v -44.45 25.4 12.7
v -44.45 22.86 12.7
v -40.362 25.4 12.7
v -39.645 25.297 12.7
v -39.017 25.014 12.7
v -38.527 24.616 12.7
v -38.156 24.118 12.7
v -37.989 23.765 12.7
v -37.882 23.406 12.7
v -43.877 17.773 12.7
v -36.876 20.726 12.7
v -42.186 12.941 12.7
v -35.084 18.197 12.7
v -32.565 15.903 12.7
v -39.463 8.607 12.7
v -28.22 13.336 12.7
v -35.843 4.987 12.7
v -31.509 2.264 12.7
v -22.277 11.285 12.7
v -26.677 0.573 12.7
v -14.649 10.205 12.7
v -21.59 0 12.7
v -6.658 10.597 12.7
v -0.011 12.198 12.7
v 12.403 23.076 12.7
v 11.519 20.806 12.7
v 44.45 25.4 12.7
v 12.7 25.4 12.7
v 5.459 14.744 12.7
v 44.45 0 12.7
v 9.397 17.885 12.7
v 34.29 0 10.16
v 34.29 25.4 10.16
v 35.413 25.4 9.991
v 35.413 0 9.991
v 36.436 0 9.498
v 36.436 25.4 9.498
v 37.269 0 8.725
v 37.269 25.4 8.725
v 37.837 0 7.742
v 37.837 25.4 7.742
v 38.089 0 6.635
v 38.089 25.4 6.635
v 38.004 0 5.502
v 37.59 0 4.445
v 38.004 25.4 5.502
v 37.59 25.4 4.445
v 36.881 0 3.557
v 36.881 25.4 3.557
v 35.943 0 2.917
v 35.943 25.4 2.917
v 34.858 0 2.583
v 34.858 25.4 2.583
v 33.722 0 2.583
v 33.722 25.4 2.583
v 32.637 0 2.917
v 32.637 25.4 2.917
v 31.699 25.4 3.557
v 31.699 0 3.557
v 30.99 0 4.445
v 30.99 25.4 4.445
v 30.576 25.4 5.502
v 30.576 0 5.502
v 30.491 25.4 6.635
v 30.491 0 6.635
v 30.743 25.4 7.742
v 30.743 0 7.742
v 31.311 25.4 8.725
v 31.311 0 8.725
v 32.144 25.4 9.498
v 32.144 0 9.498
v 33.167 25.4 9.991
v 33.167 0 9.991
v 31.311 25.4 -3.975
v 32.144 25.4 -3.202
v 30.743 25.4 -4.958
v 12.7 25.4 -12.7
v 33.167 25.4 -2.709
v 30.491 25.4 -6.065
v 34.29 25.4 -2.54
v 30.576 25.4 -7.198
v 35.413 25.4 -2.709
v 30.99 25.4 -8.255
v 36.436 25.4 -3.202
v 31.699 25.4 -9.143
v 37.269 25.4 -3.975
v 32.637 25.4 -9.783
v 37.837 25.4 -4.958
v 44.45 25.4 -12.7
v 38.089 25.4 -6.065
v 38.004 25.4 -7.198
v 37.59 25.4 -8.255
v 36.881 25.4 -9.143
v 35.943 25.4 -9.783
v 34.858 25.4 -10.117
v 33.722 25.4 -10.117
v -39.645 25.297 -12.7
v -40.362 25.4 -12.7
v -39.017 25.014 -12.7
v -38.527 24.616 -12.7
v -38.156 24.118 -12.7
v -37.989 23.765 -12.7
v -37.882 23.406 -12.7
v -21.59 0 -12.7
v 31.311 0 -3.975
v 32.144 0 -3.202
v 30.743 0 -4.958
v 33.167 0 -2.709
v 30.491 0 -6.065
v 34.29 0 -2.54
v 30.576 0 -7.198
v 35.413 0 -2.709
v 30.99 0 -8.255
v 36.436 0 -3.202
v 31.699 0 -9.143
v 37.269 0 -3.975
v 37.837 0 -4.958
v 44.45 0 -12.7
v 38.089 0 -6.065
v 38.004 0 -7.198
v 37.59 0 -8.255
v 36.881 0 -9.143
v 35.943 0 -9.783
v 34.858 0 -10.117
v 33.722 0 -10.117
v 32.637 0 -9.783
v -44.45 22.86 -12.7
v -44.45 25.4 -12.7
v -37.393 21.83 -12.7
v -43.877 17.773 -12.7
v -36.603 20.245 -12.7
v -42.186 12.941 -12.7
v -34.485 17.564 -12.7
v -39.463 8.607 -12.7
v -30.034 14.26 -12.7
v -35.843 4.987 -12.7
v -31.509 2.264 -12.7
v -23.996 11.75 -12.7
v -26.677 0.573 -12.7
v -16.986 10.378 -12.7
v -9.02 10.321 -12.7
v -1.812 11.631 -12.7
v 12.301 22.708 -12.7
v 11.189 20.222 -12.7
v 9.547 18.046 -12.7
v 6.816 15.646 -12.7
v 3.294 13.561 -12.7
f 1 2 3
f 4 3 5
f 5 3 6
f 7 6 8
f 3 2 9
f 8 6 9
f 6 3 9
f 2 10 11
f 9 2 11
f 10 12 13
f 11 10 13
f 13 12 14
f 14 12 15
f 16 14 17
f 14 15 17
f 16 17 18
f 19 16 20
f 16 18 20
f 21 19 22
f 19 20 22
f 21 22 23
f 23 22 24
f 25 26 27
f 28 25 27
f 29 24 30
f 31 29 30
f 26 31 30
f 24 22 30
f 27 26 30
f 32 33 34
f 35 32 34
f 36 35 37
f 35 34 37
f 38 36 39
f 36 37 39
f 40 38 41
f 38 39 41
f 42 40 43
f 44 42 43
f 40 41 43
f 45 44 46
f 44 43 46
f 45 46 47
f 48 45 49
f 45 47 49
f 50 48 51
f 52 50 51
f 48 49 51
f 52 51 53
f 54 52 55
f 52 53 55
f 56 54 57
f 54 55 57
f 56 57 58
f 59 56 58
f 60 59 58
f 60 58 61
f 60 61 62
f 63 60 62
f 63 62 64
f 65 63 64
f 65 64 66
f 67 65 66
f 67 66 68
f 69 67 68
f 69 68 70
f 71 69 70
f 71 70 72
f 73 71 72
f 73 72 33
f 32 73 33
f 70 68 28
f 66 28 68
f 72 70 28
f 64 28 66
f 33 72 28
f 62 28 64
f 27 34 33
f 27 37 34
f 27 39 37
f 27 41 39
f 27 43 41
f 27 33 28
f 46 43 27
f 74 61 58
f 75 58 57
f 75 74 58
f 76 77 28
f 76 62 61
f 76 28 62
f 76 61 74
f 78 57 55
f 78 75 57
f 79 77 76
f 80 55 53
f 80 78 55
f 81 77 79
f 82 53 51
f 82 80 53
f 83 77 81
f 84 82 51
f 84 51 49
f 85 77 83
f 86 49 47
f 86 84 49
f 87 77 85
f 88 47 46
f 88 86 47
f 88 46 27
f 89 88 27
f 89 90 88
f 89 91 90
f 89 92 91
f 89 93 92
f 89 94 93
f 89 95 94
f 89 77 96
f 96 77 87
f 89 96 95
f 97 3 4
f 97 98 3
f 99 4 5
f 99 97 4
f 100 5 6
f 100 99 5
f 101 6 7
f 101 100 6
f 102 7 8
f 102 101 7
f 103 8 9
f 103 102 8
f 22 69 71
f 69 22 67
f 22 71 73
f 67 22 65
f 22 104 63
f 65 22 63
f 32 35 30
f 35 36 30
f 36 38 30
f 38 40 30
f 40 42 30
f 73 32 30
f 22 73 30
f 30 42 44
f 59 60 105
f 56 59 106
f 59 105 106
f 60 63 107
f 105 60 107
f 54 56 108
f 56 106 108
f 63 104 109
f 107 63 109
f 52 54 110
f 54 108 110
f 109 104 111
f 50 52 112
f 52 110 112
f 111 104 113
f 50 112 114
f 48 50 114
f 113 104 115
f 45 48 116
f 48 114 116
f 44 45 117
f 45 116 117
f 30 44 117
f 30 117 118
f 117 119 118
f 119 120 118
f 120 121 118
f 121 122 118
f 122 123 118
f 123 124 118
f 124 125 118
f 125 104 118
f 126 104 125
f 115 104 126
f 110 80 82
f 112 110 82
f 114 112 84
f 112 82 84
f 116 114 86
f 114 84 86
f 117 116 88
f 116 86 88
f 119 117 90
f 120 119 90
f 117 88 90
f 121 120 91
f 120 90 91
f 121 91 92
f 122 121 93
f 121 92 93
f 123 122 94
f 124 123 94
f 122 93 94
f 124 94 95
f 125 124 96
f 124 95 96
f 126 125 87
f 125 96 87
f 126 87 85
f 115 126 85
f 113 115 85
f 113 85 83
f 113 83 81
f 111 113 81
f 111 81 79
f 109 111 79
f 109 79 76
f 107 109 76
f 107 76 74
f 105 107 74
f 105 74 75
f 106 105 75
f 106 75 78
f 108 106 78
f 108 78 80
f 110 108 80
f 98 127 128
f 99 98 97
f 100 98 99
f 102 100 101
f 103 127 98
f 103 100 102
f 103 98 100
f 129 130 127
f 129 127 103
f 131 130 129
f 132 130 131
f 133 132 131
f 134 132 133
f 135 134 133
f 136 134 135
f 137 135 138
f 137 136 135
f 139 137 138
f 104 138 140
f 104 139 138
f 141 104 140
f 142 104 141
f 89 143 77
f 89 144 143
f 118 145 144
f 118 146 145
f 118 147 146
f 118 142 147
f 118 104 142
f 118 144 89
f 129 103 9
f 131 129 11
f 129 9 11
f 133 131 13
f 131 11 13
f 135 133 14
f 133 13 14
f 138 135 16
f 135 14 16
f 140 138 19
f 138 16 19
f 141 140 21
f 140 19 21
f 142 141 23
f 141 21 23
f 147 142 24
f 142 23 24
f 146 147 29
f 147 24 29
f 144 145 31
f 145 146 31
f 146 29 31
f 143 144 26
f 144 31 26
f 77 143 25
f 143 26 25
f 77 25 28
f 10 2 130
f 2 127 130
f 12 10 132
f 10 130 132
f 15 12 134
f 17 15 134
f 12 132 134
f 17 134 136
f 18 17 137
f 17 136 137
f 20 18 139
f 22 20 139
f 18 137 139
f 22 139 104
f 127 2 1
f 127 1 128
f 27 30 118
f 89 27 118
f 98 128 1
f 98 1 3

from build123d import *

# Parameters (mm, degrees)
SKETCH1_W           = 88.9
SKETCH1_H           = 25.4
BOSS_EXTRUDE1_DEPTH = 25.4
SKETCH2_RX          = 25.4
SKETCH2_RY          = 15.24
CUT_EXTRUDE1_DEPTH  = 58.15
FILLET1_R           = 2.54
SKETCH5_R           = 3.81
CUT_EXTRUDE2_DEPTH  = 53.747061686
FILLET2_R           = 22.86


with BuildPart() as part:
    # Sketch1 → Boss-Extrude1 (new body)
    with BuildSketch(Plane(origin=(0, 0, 0), x_dir=(1, 0, 0), z_dir=(0, 1, 0))):
        Rectangle(SKETCH1_W, SKETCH1_H)
    extrude(amount=BOSS_EXTRUDE1_DEPTH)

    # Sketch2 → Cut-Extrude1 (cut, through all)
    with BuildSketch(Plane.XY.offset(12.7)):
        with Locations(Location((-12.7, 25.4), (0, 0, 180))):
            Ellipse(SKETCH2_RX, SKETCH2_RY)
    extrude(amount=-CUT_EXTRUDE1_DEPTH, mode=Mode.SUBTRACT)

    # Fillet1
    fillet1_edges = [part.edges().sort_by_distance(p)[0] for p in [
        (-38.1, 25.4, 0),
    ]]
    fillet(fillet1_edges, radius=FILLET1_R)

    # Sketch5 → Cut-Extrude2 (cut, through all)
    with BuildSketch(Plane(origin=(0, 25.4, 0), x_dir=(1, 0, 0), z_dir=(0, 1, 0))):
        with Locations(Location((34.29, 6.35, 0), (0, 0, 270))):
            Circle(SKETCH5_R)
        with Locations(Location((34.29, -6.35, 0), (0, 0, 270))):
            Circle(SKETCH5_R)
    extrude(amount=-CUT_EXTRUDE2_DEPTH, mode=Mode.SUBTRACT)

    # Fillet2
    fillet2_edges = [part.edges().sort_by_distance(p)[0] for p in [
        (-44.45, 0, 0),
    ]]
    fillet(fillet2_edges, radius=FILLET2_R)


solid = part.part
